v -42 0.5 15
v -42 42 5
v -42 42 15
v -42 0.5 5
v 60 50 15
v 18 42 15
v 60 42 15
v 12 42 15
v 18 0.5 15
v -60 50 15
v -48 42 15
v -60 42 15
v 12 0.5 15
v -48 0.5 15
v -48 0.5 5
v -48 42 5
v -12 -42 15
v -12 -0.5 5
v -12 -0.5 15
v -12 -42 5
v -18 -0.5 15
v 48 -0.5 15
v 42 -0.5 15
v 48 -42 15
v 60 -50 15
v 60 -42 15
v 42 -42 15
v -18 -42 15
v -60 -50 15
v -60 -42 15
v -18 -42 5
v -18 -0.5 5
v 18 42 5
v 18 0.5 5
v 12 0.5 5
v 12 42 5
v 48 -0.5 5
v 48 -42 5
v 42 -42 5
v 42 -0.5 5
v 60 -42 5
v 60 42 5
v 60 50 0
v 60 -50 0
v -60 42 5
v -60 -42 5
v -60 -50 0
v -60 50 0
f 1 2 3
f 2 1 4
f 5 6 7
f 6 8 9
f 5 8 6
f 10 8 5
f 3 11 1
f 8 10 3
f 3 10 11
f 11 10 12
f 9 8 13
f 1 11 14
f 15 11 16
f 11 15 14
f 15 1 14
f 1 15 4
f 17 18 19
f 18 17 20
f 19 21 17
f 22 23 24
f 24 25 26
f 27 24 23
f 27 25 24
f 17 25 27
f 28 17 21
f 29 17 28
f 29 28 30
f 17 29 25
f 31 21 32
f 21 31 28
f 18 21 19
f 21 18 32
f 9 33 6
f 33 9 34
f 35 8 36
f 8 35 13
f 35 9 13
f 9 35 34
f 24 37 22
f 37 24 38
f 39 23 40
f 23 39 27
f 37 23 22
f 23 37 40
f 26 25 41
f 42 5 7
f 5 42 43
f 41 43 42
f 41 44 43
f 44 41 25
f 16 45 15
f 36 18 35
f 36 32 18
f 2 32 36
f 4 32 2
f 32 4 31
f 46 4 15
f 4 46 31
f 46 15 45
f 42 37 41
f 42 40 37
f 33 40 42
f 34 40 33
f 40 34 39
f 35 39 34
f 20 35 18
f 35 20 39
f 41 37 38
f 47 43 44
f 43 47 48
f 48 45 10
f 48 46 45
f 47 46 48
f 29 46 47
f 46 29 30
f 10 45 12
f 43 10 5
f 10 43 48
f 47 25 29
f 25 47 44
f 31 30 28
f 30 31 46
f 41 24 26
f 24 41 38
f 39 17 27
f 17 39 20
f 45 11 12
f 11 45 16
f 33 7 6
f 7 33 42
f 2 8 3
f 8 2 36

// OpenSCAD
$fn = 32;

// ----------------------------------------------------------------------
// Rib frame 120 x 100 x 15
// 4 ribs at 30 mm pitch, staggered
// ----------------------------------------------------------------------

// --- parameters (mm) ---
frame = [120, 100, 5];  // base plate size (x, y, z)
rail_w = 8;             // side rail width
ribs = 4;               // number of ribs
rib_t = 6;              // rib thickness
rib_h = 10;             // rib height above the base plate
pitch = 30;             // pitch between rib centres

// --- derived feature positions (mm) ---
span = (ribs - 1) * pitch;          // = 90   distance between the outer ribs
origin_x = -span / 2;               // = -45   X of the first rib
rib_len = frame[1] / 2 - rail_w + 0.5;  // = 42.5   length of a staggered rib
rib_y = 0.5 + rib_len / 2;          // = 21.75   Y of a staggered rib centre
row_offset = 2 * rib_y;             // = 43.5   distance between the two rows
feature_centers = [
  [origin_x + 0 * pitch, rib_y],
  [origin_x + 1 * pitch, -rib_y],
  [origin_x + 2 * pitch, rib_y],
  [origin_x + 3 * pitch, -rib_y]
];   // rib centre line, drives the rib loop

// base plate, two side rails, then the ribs read straight off feature_centers
union() {
  translate([-frame[0] / 2, -frame[1] / 2, 0]) cube(frame);
  translate([-frame[0] / 2, -frame[1] / 2, 0]) cube([frame[0], rail_w, frame[2] + rib_h]);
  translate([-frame[0] / 2, frame[1] / 2 - rail_w, 0]) cube([frame[0], rail_w, frame[2] + rib_h]);
  for (centre = feature_centers)
    translate([centre[0] - rib_t / 2, centre[1] - rib_len / 2, frame[2] - 1])
      cube([rib_t, rib_len, rib_h + 1]);
}
